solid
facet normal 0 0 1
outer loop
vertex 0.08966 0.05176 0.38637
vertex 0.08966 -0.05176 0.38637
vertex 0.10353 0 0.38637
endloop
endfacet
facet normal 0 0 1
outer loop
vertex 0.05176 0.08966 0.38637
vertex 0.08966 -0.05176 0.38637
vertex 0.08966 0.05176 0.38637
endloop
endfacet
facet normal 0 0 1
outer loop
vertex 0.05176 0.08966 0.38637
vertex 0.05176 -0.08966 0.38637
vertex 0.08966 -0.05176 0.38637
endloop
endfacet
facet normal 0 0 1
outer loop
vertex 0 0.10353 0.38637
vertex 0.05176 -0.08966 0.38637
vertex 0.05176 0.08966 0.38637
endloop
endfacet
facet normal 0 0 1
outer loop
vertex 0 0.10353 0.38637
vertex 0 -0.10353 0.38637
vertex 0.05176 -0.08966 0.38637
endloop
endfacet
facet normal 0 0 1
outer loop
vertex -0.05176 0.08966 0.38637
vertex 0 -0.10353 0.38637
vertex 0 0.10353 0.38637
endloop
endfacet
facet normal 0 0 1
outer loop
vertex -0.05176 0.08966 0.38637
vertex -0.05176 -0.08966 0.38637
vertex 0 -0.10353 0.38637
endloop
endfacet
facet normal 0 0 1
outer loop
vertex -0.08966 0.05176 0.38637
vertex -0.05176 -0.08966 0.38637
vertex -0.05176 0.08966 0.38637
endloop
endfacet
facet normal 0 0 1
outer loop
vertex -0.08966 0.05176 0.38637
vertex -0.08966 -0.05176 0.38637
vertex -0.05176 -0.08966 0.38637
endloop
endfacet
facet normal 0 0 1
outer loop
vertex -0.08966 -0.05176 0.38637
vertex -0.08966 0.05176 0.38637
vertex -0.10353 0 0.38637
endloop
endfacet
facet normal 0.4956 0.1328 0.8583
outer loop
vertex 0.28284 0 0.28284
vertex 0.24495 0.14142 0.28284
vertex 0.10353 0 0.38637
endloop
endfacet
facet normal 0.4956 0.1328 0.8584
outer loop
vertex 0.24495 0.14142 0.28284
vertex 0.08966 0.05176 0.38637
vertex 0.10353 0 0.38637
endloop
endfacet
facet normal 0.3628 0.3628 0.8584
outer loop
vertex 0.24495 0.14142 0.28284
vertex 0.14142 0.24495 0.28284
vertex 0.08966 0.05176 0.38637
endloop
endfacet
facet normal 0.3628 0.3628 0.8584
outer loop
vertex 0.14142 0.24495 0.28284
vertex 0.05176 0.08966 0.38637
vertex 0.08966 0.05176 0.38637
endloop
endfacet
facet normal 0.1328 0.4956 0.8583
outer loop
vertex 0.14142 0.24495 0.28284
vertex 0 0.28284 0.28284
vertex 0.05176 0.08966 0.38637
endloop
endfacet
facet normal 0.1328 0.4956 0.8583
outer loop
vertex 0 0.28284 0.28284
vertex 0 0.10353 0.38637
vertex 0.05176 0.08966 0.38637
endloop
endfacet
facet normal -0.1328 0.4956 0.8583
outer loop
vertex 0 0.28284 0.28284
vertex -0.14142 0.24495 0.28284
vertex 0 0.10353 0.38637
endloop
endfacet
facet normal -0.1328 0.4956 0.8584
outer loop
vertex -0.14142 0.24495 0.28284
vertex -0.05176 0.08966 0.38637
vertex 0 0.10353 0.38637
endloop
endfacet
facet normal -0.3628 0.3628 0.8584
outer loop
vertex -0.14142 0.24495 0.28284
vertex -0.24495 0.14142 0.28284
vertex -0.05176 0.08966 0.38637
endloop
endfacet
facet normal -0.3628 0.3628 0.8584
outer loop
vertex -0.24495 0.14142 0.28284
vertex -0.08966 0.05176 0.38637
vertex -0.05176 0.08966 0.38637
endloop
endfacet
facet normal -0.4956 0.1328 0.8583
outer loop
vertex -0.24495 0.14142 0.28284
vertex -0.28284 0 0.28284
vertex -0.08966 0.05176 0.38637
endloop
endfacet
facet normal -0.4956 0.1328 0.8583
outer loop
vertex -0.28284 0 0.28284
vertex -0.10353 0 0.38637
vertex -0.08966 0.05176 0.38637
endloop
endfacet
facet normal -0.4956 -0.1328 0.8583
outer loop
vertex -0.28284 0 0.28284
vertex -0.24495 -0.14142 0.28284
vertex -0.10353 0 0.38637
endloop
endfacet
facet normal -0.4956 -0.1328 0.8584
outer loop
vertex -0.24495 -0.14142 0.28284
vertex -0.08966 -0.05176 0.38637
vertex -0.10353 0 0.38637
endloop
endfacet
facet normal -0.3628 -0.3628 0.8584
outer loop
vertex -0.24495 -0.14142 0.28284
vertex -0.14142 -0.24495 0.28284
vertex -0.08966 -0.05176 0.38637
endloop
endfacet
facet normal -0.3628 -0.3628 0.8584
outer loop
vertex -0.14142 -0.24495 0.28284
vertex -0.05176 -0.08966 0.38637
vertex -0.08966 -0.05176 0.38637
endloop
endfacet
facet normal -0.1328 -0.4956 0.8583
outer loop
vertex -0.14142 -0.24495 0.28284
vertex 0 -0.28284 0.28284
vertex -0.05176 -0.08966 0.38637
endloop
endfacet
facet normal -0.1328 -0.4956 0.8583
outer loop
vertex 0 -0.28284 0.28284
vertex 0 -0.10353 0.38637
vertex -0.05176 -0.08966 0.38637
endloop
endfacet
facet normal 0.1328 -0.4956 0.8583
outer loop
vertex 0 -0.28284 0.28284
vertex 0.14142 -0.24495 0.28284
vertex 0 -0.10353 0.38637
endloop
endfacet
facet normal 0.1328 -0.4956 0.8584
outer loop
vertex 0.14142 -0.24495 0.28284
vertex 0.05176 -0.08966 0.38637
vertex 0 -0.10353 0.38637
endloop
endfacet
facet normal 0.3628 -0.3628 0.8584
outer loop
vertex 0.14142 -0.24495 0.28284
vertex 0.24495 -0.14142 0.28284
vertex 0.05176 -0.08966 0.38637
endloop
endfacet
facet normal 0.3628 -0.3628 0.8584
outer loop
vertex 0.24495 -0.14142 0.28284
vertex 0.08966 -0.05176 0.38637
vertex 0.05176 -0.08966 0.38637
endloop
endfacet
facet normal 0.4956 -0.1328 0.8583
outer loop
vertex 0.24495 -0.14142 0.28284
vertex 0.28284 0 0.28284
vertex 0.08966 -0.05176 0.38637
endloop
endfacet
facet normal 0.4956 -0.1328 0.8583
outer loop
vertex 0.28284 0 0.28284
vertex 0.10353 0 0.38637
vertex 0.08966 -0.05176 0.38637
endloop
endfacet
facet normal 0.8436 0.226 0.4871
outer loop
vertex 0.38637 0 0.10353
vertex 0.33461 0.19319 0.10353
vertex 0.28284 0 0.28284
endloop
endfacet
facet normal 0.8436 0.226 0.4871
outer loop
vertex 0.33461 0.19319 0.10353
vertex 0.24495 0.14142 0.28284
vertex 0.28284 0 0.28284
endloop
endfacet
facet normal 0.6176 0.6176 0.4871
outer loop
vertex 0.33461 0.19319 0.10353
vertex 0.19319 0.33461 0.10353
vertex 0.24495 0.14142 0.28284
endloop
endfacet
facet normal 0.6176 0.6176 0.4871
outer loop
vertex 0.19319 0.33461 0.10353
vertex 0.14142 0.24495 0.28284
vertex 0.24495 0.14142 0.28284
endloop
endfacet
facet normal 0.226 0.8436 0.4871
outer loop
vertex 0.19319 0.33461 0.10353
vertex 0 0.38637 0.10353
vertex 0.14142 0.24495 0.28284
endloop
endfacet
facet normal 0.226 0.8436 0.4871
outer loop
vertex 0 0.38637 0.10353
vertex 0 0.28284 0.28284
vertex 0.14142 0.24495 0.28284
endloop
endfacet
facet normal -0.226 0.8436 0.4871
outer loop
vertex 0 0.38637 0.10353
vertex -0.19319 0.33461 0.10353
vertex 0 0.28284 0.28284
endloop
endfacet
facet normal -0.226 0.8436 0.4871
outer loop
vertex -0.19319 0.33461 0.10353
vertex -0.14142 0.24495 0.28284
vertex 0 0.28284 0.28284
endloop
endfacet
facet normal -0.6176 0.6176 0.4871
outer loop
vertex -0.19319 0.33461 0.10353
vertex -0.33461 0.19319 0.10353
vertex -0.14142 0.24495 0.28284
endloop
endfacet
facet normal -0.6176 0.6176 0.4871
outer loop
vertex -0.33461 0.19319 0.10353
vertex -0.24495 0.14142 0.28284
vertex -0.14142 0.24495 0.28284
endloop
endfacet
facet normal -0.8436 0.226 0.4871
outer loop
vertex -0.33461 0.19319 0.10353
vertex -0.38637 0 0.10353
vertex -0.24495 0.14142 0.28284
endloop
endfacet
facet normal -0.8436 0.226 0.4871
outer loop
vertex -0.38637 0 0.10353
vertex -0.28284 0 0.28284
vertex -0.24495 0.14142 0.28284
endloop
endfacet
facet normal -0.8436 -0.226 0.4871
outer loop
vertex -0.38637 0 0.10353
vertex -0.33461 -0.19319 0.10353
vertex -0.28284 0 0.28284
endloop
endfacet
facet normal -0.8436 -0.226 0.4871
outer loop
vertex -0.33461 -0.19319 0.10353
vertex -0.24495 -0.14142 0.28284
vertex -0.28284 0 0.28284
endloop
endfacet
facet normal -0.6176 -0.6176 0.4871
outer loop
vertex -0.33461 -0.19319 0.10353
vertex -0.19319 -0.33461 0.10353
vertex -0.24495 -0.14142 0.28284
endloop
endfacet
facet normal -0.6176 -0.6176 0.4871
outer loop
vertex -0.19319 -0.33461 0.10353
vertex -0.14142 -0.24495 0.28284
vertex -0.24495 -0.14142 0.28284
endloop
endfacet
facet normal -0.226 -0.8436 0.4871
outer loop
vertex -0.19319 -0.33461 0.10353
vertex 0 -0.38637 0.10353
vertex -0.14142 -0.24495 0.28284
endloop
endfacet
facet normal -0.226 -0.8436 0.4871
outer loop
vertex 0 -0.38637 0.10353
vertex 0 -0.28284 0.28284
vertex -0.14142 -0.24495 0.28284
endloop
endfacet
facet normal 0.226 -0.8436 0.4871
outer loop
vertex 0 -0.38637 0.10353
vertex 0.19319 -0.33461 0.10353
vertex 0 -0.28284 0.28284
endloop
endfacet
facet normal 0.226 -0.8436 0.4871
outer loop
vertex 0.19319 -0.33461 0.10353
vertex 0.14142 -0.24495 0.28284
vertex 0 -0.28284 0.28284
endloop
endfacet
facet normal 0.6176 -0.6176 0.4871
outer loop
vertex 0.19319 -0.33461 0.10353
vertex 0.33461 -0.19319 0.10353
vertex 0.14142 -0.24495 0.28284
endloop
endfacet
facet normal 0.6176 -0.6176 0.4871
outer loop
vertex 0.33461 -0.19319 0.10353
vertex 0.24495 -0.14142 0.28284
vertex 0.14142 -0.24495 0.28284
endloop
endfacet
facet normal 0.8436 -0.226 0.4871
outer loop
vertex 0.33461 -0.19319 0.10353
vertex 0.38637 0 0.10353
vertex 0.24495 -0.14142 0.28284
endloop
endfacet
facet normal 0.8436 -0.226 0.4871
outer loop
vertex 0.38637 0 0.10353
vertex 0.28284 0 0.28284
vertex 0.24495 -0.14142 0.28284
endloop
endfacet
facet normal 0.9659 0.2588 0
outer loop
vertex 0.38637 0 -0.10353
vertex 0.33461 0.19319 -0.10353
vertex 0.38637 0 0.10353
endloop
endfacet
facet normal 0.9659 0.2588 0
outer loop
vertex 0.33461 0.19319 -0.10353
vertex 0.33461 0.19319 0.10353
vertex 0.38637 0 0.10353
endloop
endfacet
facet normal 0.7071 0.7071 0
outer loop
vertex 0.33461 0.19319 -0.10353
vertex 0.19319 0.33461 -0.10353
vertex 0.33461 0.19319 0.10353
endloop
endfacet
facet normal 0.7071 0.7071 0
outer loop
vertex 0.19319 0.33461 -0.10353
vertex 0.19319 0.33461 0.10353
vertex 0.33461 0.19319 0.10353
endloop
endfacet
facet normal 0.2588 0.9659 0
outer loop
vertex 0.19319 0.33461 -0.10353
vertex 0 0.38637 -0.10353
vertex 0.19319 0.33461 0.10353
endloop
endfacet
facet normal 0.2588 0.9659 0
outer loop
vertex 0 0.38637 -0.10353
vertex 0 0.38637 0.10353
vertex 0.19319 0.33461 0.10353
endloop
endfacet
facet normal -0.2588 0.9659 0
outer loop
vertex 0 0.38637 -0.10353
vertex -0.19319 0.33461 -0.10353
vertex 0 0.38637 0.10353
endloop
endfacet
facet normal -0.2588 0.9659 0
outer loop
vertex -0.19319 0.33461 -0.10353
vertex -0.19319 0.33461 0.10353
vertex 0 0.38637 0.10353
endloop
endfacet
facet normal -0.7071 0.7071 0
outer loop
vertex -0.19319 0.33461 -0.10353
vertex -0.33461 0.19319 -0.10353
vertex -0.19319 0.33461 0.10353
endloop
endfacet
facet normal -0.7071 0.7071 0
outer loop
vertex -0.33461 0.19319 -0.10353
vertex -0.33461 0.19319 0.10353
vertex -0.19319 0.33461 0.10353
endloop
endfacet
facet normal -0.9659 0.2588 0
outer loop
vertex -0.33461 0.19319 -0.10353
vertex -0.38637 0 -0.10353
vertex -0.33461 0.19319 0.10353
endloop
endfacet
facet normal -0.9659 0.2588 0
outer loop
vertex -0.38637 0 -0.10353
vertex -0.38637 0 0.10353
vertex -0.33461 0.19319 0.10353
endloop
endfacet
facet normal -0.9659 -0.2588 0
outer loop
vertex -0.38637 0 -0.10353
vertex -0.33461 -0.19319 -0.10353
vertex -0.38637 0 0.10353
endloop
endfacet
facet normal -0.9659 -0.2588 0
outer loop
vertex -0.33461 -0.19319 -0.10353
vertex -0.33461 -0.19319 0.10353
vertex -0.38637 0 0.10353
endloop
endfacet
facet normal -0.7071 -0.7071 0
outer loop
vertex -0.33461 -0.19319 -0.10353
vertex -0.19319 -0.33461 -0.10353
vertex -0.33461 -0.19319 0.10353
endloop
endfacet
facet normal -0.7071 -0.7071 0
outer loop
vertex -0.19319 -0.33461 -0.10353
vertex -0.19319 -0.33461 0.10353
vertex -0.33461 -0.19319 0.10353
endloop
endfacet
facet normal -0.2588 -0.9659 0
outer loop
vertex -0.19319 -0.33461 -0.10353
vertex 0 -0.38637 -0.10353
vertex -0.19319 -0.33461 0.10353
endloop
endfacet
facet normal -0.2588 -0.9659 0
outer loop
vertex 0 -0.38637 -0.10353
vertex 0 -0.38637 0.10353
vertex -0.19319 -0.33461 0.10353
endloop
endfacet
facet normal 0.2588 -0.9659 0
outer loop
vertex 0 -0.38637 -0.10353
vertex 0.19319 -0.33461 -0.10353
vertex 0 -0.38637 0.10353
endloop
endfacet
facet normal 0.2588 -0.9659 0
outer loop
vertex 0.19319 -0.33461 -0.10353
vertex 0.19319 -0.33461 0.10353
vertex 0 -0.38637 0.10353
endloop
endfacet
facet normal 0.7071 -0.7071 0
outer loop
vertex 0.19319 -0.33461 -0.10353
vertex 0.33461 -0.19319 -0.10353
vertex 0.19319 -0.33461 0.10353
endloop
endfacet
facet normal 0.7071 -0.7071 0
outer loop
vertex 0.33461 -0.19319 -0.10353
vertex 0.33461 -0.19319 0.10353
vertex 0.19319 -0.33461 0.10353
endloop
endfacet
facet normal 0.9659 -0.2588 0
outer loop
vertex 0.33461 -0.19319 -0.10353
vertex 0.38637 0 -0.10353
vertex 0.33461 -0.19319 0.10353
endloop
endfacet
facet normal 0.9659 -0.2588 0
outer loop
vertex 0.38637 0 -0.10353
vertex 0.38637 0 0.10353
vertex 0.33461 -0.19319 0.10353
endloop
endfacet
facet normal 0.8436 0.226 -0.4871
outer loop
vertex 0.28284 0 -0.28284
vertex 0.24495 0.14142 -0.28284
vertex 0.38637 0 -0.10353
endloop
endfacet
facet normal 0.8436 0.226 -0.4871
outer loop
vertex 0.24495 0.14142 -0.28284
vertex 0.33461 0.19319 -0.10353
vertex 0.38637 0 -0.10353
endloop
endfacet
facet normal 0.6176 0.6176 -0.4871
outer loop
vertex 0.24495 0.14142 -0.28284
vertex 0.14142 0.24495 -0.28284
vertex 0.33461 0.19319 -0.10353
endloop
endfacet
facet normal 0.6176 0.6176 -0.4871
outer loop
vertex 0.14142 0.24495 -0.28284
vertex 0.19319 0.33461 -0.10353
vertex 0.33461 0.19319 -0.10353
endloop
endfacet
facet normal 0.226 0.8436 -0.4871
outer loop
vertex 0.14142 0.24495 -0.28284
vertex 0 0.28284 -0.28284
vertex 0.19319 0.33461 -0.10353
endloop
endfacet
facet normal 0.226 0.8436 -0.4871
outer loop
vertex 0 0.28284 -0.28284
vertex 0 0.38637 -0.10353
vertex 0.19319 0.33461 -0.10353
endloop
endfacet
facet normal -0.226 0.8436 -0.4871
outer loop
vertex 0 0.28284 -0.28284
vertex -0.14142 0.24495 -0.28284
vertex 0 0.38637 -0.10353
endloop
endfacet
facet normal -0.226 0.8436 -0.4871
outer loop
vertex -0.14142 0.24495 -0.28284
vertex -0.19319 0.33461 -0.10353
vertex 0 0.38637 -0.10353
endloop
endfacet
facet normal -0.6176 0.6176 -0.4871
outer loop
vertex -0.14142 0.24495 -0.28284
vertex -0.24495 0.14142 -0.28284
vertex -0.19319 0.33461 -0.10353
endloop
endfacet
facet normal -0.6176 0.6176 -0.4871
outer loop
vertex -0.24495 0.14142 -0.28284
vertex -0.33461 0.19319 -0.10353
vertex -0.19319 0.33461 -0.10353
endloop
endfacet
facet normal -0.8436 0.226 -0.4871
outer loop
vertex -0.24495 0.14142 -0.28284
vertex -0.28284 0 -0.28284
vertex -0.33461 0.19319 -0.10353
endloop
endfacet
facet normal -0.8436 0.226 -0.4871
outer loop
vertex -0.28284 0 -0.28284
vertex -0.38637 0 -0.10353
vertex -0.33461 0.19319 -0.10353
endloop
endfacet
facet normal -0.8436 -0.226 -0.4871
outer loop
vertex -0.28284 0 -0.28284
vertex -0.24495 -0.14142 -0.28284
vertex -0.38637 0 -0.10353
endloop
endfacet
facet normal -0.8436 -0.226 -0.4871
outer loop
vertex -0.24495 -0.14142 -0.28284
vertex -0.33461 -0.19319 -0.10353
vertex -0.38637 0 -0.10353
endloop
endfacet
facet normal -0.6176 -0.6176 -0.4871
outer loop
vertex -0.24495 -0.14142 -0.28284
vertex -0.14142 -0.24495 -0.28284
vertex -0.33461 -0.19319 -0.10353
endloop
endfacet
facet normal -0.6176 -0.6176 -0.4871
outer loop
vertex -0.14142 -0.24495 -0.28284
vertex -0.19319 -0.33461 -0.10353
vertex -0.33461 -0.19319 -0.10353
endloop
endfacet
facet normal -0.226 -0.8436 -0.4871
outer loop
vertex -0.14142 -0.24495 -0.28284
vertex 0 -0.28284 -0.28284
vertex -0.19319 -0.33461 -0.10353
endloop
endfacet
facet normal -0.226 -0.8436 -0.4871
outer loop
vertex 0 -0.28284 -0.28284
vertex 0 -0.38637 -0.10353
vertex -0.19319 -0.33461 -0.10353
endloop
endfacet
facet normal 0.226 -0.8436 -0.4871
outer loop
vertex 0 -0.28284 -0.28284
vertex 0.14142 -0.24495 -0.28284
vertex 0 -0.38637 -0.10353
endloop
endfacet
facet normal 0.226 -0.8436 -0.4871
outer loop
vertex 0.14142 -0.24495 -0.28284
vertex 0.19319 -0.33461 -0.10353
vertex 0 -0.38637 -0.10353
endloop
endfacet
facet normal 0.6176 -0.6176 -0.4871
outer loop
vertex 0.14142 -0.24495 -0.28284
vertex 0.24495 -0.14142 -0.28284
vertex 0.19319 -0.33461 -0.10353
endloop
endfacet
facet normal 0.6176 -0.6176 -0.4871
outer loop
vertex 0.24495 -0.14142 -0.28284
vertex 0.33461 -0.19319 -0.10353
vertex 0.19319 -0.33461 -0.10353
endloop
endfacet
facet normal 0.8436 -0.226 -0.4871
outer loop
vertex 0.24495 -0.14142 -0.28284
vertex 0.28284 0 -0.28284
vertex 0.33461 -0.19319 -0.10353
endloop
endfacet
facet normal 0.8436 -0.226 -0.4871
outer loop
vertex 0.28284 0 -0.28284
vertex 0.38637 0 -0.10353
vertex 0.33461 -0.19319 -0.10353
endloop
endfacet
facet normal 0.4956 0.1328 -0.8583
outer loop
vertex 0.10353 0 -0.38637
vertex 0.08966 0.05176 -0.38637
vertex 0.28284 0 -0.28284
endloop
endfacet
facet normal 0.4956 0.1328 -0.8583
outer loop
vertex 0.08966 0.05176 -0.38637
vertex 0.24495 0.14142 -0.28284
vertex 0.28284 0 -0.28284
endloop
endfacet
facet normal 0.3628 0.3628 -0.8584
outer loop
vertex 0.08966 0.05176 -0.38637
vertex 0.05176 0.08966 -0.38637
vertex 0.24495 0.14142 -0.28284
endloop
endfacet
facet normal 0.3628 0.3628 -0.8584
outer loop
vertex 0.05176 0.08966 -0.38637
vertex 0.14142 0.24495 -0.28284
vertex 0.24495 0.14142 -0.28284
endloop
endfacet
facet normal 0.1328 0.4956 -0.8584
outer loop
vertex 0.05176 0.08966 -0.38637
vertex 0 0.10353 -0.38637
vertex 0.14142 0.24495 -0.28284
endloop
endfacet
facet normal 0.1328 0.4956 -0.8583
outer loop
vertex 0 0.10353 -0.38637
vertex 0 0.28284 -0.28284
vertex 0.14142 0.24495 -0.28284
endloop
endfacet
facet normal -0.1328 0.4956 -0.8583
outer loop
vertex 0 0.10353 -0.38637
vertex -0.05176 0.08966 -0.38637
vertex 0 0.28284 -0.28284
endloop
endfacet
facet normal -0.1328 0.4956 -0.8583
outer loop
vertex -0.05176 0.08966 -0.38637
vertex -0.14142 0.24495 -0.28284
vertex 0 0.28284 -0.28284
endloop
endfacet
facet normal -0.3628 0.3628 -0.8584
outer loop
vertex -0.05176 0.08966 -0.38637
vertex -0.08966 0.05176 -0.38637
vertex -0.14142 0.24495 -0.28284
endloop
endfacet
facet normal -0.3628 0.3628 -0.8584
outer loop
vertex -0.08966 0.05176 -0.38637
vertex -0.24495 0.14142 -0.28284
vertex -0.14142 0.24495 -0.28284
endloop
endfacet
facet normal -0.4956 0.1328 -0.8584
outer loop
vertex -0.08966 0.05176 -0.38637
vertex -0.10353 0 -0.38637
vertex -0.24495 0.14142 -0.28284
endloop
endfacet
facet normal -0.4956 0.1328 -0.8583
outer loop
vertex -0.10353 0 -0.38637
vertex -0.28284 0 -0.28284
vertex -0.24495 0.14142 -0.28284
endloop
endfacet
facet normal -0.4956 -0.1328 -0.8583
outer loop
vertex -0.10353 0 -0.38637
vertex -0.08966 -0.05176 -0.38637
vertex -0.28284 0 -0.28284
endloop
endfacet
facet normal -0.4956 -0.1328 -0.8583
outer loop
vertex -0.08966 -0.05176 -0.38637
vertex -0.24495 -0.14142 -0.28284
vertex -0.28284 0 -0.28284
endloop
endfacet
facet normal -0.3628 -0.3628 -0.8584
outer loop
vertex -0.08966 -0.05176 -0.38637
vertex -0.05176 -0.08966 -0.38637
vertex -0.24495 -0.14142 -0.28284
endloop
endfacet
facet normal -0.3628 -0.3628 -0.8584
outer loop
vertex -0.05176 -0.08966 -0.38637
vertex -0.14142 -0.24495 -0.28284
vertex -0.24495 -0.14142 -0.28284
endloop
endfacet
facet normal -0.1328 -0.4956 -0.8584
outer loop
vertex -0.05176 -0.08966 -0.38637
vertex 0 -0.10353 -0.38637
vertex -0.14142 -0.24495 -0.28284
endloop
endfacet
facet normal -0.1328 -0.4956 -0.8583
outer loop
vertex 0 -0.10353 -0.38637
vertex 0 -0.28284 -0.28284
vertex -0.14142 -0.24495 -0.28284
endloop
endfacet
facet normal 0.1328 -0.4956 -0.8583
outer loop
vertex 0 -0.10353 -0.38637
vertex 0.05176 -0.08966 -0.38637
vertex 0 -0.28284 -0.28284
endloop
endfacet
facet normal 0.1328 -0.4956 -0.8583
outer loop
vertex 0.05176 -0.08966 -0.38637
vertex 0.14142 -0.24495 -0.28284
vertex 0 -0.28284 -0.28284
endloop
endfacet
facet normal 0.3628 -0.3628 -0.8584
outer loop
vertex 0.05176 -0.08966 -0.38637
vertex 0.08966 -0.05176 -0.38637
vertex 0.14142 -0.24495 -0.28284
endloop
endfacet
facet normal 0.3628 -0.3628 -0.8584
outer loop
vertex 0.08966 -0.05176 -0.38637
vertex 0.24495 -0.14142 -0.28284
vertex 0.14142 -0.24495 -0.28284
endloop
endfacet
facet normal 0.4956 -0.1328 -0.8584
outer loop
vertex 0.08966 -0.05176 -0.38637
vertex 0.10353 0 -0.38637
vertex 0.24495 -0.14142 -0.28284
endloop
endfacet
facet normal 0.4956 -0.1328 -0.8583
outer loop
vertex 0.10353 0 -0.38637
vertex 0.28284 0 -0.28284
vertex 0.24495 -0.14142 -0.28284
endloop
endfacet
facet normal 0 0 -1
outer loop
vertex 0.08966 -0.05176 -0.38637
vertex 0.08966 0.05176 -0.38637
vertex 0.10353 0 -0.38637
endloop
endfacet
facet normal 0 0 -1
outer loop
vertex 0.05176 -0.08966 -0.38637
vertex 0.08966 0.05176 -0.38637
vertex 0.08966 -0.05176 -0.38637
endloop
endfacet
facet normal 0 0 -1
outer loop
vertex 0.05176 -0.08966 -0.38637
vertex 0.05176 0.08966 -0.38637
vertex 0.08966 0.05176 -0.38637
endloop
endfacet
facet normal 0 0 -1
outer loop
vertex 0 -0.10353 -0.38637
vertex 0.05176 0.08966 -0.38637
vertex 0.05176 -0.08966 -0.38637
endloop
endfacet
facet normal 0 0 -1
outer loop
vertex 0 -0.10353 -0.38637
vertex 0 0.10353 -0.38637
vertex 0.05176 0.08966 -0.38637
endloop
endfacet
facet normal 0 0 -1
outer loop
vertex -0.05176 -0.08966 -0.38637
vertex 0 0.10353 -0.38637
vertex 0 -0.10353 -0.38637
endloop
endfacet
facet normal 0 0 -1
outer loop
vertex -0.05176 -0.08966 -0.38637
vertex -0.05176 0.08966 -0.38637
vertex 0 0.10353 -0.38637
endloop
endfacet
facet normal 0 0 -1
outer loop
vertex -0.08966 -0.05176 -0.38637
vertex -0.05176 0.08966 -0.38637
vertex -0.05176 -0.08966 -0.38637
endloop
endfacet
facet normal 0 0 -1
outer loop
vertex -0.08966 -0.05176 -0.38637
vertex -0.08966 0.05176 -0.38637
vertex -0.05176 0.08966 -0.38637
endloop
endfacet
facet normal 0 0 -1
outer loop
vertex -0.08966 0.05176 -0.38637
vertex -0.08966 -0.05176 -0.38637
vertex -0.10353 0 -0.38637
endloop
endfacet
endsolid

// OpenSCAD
use <lib.scad>

module body() {
	sphere(r=0.4);
}

body($fn=12);
